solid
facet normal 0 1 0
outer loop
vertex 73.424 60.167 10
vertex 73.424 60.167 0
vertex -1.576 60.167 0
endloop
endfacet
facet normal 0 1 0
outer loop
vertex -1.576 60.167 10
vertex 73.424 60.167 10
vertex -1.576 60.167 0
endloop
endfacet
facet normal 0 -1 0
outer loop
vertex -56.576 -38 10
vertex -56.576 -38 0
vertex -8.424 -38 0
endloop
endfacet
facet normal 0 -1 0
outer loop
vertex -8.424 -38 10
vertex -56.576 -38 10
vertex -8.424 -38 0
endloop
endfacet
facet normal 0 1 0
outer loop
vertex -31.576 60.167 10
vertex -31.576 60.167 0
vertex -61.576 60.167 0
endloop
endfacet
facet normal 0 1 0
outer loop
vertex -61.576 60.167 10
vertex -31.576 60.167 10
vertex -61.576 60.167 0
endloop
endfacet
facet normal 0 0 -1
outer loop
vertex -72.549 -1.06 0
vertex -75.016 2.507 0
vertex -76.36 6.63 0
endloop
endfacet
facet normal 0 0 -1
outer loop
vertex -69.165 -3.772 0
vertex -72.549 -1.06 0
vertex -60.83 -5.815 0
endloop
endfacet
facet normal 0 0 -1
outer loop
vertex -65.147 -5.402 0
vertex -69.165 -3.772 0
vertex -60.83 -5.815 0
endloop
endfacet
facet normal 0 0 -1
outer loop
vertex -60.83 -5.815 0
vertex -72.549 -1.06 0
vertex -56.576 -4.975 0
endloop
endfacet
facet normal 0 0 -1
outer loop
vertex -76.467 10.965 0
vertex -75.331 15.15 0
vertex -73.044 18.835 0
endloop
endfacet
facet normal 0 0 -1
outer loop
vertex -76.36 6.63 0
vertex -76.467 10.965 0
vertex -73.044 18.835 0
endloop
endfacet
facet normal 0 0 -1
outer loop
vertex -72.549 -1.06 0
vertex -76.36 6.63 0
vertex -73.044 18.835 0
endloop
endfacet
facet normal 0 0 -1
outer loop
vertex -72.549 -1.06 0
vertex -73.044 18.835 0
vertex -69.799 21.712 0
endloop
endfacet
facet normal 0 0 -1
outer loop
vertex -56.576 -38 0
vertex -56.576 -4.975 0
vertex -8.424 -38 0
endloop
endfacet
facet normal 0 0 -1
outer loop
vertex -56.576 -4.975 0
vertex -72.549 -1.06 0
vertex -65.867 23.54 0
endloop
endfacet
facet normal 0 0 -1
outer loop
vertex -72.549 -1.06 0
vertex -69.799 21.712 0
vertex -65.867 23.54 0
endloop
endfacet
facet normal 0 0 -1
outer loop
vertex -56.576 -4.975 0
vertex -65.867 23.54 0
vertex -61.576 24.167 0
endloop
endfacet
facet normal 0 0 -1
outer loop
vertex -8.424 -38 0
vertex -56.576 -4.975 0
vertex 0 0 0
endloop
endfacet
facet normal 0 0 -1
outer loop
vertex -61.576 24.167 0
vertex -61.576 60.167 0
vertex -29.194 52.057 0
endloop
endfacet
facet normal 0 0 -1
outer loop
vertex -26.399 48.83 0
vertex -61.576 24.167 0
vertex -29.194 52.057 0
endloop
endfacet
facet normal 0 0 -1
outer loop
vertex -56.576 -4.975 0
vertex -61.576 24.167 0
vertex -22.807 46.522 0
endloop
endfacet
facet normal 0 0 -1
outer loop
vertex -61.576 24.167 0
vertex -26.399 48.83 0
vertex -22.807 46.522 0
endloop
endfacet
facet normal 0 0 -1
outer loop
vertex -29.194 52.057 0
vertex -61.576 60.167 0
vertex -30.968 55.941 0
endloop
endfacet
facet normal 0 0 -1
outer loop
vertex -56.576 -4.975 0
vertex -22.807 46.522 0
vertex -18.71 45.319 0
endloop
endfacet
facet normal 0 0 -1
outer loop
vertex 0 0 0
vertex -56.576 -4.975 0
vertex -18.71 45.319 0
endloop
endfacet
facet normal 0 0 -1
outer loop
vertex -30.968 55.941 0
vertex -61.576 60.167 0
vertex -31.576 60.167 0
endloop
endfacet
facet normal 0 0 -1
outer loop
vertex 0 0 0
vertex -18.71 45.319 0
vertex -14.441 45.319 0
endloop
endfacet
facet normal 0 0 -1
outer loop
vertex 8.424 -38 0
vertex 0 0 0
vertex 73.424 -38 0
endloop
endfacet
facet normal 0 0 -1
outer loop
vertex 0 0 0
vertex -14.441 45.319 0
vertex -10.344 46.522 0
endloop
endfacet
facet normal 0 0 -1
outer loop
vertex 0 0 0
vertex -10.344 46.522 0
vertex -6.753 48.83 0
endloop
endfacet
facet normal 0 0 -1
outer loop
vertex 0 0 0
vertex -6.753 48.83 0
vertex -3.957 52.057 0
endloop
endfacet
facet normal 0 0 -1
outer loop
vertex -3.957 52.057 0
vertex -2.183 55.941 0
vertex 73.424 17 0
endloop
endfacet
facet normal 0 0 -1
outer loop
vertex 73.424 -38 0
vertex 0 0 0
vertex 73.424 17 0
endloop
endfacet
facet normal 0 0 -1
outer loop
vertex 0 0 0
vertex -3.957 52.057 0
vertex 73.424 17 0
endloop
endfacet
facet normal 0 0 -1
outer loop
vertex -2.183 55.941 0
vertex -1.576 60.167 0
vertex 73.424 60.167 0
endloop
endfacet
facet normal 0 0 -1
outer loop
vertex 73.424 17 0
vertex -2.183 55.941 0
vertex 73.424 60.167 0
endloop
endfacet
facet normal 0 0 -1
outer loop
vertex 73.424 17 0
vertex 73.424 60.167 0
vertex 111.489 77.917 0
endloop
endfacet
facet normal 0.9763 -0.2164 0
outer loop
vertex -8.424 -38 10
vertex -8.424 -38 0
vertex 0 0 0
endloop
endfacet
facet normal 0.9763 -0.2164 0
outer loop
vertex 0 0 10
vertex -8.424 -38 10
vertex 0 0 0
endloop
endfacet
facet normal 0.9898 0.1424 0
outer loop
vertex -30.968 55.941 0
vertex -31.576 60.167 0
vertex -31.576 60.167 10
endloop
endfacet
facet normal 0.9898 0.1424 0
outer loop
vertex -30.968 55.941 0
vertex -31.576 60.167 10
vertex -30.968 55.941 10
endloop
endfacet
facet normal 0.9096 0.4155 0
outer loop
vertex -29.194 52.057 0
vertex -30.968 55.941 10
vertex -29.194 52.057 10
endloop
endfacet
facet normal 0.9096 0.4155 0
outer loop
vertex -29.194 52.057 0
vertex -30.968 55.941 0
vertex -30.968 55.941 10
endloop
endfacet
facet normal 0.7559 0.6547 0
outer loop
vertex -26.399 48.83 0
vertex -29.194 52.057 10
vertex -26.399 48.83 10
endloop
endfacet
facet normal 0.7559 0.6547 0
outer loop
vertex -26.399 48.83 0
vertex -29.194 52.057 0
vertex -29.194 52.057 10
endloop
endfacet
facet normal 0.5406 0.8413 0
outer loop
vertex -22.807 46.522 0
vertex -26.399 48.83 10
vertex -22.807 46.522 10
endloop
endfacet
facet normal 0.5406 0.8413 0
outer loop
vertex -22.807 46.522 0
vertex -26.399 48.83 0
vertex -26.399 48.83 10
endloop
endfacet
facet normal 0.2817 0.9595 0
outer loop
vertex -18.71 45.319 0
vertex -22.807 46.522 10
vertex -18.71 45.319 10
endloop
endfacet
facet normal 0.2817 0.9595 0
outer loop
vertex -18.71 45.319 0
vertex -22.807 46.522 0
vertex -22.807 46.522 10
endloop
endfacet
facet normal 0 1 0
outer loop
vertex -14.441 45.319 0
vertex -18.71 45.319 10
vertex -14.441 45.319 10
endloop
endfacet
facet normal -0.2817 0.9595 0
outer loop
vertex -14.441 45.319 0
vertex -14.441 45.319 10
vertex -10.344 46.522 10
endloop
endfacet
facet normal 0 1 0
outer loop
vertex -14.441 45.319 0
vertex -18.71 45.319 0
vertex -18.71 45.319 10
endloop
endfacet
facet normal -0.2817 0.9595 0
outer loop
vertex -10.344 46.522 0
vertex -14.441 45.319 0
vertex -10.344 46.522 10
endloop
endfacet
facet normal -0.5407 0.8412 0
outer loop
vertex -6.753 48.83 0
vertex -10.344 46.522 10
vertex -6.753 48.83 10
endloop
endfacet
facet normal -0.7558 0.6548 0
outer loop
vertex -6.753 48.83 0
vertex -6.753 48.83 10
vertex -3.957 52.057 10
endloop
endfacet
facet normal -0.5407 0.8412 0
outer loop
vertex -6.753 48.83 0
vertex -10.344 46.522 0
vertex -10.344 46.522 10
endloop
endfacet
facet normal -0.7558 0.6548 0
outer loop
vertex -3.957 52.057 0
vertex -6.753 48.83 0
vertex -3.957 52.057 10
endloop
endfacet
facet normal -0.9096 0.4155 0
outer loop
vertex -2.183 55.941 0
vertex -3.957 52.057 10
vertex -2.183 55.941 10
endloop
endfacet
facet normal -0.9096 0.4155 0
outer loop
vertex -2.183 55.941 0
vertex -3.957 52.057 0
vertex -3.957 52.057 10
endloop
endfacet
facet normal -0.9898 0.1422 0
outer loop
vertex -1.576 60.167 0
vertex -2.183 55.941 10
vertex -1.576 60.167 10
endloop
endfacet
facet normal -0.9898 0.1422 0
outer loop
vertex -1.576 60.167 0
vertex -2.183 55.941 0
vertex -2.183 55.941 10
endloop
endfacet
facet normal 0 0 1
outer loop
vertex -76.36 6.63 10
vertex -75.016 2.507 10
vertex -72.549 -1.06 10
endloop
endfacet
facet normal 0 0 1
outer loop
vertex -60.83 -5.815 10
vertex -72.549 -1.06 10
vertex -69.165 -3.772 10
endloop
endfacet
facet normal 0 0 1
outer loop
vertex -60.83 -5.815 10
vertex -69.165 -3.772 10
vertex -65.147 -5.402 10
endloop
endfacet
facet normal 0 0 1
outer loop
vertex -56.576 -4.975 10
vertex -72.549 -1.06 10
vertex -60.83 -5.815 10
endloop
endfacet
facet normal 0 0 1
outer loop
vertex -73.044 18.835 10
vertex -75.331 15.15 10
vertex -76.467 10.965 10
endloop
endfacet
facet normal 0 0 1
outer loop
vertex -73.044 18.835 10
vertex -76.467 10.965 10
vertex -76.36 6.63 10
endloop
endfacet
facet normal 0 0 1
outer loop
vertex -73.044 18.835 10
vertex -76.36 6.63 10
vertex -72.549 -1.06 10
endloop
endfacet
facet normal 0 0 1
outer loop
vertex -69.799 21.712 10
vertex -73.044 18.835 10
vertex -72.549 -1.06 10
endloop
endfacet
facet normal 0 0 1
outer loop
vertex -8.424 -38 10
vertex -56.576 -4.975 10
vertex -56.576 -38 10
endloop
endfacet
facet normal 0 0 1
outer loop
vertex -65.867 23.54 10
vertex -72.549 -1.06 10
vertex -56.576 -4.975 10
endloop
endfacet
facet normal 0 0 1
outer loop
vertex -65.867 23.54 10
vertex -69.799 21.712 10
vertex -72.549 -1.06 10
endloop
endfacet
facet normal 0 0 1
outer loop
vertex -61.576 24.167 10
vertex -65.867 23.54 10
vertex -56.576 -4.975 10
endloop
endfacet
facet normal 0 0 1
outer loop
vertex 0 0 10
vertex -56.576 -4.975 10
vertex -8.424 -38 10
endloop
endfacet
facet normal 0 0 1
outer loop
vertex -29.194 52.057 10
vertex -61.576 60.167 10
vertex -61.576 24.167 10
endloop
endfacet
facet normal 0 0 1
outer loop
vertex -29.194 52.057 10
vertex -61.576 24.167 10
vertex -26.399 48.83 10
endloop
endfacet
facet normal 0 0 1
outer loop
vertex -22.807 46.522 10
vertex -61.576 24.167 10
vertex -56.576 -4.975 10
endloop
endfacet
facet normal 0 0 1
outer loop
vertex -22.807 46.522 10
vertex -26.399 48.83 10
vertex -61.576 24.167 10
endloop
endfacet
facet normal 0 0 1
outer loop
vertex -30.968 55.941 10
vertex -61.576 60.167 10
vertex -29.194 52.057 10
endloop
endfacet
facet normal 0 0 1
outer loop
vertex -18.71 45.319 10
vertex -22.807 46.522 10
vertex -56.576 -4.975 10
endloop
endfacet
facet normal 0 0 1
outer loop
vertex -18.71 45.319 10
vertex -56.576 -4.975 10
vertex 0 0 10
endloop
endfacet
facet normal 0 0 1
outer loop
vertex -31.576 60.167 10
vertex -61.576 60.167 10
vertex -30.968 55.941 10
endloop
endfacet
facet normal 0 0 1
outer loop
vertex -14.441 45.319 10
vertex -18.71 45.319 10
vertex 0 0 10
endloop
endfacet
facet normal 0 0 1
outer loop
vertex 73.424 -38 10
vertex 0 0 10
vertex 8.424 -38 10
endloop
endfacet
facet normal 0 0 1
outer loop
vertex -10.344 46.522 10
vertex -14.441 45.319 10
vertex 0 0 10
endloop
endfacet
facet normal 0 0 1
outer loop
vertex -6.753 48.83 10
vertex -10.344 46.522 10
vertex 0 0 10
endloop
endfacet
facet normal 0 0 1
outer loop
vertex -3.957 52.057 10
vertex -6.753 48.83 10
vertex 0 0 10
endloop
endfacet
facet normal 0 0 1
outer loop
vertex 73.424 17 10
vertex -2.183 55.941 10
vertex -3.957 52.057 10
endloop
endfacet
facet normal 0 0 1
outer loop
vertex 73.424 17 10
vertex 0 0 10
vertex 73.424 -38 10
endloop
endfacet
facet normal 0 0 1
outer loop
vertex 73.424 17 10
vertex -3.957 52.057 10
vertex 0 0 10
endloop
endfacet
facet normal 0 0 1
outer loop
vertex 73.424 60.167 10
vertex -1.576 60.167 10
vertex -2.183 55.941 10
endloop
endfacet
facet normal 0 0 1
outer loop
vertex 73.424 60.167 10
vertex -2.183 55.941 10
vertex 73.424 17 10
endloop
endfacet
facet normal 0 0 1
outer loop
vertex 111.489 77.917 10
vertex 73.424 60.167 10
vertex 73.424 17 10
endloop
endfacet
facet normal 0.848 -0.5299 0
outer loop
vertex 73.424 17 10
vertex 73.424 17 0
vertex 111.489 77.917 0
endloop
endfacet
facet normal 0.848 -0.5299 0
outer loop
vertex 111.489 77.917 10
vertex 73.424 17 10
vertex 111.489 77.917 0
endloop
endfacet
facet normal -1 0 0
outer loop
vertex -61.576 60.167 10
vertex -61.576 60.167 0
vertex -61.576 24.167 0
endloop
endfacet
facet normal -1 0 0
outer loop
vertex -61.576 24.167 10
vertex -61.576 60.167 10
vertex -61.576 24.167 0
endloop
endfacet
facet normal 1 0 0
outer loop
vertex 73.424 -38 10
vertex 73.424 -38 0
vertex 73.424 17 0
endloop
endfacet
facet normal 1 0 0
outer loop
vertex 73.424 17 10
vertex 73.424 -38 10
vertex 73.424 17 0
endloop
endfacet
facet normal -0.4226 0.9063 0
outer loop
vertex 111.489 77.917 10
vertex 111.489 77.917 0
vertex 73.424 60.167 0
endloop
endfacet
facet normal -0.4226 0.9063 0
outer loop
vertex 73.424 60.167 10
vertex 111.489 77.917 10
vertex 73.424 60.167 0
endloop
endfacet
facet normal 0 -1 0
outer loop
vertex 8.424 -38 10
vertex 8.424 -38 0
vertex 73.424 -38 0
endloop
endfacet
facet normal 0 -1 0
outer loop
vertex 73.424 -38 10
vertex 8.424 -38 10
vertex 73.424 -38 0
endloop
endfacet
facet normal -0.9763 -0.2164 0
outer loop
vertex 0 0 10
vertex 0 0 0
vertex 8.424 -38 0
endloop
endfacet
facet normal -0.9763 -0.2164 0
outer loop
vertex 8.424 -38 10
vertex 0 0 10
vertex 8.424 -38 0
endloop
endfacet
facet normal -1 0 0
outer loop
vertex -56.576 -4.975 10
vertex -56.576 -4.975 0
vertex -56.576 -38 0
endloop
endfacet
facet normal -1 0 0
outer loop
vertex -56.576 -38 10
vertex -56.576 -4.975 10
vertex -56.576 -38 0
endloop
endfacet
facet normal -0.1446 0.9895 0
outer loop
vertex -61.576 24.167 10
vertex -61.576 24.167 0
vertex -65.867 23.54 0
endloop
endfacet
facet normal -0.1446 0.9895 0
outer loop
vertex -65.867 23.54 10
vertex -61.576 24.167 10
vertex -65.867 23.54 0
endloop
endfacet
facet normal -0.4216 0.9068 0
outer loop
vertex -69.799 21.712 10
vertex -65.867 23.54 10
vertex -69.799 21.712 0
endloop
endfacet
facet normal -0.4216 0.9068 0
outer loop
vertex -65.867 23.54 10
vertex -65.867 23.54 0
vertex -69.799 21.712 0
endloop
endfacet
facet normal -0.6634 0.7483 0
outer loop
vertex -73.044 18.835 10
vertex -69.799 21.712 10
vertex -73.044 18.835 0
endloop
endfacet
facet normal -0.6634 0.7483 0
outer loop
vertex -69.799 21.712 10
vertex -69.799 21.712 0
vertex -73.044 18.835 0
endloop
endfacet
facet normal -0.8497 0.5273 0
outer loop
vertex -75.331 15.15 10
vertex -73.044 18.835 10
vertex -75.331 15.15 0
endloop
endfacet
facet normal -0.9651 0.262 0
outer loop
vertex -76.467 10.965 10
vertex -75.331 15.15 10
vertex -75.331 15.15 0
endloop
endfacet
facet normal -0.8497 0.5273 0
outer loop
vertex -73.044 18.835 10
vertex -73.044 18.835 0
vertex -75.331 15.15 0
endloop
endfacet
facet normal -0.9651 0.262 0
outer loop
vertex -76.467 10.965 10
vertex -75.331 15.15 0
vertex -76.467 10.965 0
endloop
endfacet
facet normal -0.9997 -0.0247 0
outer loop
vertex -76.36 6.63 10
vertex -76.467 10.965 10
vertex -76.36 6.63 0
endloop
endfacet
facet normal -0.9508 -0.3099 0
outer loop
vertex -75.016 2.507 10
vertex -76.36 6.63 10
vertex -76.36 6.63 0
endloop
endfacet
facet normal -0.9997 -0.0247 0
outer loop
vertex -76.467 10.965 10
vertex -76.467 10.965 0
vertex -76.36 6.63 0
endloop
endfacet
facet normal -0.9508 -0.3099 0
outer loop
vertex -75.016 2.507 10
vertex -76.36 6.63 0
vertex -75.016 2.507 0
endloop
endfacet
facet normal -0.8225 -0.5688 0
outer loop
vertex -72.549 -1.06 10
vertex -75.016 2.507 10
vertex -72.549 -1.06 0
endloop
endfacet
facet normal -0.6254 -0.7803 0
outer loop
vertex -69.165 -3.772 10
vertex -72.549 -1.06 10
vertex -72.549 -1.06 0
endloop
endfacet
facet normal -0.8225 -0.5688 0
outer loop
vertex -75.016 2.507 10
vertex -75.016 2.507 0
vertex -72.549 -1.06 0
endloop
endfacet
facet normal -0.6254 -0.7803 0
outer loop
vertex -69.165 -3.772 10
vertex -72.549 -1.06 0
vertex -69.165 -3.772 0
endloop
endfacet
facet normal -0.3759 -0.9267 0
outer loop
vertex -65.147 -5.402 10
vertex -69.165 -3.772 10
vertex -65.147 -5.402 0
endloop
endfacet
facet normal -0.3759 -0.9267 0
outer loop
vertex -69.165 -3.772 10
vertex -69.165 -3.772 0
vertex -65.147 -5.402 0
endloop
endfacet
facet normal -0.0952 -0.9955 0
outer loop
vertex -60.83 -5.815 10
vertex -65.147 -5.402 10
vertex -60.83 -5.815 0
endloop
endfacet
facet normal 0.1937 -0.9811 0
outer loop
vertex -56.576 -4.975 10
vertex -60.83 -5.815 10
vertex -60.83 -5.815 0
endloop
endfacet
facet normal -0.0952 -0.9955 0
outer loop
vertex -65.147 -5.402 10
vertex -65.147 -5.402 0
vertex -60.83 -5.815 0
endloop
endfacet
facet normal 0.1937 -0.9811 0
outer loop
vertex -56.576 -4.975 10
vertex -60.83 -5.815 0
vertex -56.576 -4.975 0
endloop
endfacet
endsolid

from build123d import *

# Parameters (mm, degrees)
PAD_DEPTH = 10


with BuildPart() as part:
    # Sketch → Pad (new body)
    with BuildSketch(Plane.XY):
        with BuildLine():
            Line((111.489324, 77.916617), (73.424397, 60.16665))
            Line((73.424397, 60.16665), (-1.575603, 60.16665))
            ThreePointArc((-31.575603, 60.16665), (-16.575603, 45.16665), (-1.575603, 60.16665))
            Line((-31.575603, 60.16665), (-61.575603, 60.16665))
            Line((-61.575603, 60.16665), (-61.575603, 24.16665))
            ThreePointArc((-61.575603, 24.16665), (-76.359581, 6.63012), (-56.575603, -4.975486))
            Line((-56.575603, -4.975486), (-56.575603, -38))
            Line((-56.575603, -38), (-8.424397, -38))
            Line((-8.424397, -38), (0, 0))
            Line((0, 0), (8.424397, -38))
            Line((8.424397, -38), (73.424397, -38))
            Line((73.424397, -38), (73.424397, 17))
            Line((73.424397, 17), (111.489324, 77.916617))
        make_face()
    extrude(amount=PAD_DEPTH)


solid = part.part
